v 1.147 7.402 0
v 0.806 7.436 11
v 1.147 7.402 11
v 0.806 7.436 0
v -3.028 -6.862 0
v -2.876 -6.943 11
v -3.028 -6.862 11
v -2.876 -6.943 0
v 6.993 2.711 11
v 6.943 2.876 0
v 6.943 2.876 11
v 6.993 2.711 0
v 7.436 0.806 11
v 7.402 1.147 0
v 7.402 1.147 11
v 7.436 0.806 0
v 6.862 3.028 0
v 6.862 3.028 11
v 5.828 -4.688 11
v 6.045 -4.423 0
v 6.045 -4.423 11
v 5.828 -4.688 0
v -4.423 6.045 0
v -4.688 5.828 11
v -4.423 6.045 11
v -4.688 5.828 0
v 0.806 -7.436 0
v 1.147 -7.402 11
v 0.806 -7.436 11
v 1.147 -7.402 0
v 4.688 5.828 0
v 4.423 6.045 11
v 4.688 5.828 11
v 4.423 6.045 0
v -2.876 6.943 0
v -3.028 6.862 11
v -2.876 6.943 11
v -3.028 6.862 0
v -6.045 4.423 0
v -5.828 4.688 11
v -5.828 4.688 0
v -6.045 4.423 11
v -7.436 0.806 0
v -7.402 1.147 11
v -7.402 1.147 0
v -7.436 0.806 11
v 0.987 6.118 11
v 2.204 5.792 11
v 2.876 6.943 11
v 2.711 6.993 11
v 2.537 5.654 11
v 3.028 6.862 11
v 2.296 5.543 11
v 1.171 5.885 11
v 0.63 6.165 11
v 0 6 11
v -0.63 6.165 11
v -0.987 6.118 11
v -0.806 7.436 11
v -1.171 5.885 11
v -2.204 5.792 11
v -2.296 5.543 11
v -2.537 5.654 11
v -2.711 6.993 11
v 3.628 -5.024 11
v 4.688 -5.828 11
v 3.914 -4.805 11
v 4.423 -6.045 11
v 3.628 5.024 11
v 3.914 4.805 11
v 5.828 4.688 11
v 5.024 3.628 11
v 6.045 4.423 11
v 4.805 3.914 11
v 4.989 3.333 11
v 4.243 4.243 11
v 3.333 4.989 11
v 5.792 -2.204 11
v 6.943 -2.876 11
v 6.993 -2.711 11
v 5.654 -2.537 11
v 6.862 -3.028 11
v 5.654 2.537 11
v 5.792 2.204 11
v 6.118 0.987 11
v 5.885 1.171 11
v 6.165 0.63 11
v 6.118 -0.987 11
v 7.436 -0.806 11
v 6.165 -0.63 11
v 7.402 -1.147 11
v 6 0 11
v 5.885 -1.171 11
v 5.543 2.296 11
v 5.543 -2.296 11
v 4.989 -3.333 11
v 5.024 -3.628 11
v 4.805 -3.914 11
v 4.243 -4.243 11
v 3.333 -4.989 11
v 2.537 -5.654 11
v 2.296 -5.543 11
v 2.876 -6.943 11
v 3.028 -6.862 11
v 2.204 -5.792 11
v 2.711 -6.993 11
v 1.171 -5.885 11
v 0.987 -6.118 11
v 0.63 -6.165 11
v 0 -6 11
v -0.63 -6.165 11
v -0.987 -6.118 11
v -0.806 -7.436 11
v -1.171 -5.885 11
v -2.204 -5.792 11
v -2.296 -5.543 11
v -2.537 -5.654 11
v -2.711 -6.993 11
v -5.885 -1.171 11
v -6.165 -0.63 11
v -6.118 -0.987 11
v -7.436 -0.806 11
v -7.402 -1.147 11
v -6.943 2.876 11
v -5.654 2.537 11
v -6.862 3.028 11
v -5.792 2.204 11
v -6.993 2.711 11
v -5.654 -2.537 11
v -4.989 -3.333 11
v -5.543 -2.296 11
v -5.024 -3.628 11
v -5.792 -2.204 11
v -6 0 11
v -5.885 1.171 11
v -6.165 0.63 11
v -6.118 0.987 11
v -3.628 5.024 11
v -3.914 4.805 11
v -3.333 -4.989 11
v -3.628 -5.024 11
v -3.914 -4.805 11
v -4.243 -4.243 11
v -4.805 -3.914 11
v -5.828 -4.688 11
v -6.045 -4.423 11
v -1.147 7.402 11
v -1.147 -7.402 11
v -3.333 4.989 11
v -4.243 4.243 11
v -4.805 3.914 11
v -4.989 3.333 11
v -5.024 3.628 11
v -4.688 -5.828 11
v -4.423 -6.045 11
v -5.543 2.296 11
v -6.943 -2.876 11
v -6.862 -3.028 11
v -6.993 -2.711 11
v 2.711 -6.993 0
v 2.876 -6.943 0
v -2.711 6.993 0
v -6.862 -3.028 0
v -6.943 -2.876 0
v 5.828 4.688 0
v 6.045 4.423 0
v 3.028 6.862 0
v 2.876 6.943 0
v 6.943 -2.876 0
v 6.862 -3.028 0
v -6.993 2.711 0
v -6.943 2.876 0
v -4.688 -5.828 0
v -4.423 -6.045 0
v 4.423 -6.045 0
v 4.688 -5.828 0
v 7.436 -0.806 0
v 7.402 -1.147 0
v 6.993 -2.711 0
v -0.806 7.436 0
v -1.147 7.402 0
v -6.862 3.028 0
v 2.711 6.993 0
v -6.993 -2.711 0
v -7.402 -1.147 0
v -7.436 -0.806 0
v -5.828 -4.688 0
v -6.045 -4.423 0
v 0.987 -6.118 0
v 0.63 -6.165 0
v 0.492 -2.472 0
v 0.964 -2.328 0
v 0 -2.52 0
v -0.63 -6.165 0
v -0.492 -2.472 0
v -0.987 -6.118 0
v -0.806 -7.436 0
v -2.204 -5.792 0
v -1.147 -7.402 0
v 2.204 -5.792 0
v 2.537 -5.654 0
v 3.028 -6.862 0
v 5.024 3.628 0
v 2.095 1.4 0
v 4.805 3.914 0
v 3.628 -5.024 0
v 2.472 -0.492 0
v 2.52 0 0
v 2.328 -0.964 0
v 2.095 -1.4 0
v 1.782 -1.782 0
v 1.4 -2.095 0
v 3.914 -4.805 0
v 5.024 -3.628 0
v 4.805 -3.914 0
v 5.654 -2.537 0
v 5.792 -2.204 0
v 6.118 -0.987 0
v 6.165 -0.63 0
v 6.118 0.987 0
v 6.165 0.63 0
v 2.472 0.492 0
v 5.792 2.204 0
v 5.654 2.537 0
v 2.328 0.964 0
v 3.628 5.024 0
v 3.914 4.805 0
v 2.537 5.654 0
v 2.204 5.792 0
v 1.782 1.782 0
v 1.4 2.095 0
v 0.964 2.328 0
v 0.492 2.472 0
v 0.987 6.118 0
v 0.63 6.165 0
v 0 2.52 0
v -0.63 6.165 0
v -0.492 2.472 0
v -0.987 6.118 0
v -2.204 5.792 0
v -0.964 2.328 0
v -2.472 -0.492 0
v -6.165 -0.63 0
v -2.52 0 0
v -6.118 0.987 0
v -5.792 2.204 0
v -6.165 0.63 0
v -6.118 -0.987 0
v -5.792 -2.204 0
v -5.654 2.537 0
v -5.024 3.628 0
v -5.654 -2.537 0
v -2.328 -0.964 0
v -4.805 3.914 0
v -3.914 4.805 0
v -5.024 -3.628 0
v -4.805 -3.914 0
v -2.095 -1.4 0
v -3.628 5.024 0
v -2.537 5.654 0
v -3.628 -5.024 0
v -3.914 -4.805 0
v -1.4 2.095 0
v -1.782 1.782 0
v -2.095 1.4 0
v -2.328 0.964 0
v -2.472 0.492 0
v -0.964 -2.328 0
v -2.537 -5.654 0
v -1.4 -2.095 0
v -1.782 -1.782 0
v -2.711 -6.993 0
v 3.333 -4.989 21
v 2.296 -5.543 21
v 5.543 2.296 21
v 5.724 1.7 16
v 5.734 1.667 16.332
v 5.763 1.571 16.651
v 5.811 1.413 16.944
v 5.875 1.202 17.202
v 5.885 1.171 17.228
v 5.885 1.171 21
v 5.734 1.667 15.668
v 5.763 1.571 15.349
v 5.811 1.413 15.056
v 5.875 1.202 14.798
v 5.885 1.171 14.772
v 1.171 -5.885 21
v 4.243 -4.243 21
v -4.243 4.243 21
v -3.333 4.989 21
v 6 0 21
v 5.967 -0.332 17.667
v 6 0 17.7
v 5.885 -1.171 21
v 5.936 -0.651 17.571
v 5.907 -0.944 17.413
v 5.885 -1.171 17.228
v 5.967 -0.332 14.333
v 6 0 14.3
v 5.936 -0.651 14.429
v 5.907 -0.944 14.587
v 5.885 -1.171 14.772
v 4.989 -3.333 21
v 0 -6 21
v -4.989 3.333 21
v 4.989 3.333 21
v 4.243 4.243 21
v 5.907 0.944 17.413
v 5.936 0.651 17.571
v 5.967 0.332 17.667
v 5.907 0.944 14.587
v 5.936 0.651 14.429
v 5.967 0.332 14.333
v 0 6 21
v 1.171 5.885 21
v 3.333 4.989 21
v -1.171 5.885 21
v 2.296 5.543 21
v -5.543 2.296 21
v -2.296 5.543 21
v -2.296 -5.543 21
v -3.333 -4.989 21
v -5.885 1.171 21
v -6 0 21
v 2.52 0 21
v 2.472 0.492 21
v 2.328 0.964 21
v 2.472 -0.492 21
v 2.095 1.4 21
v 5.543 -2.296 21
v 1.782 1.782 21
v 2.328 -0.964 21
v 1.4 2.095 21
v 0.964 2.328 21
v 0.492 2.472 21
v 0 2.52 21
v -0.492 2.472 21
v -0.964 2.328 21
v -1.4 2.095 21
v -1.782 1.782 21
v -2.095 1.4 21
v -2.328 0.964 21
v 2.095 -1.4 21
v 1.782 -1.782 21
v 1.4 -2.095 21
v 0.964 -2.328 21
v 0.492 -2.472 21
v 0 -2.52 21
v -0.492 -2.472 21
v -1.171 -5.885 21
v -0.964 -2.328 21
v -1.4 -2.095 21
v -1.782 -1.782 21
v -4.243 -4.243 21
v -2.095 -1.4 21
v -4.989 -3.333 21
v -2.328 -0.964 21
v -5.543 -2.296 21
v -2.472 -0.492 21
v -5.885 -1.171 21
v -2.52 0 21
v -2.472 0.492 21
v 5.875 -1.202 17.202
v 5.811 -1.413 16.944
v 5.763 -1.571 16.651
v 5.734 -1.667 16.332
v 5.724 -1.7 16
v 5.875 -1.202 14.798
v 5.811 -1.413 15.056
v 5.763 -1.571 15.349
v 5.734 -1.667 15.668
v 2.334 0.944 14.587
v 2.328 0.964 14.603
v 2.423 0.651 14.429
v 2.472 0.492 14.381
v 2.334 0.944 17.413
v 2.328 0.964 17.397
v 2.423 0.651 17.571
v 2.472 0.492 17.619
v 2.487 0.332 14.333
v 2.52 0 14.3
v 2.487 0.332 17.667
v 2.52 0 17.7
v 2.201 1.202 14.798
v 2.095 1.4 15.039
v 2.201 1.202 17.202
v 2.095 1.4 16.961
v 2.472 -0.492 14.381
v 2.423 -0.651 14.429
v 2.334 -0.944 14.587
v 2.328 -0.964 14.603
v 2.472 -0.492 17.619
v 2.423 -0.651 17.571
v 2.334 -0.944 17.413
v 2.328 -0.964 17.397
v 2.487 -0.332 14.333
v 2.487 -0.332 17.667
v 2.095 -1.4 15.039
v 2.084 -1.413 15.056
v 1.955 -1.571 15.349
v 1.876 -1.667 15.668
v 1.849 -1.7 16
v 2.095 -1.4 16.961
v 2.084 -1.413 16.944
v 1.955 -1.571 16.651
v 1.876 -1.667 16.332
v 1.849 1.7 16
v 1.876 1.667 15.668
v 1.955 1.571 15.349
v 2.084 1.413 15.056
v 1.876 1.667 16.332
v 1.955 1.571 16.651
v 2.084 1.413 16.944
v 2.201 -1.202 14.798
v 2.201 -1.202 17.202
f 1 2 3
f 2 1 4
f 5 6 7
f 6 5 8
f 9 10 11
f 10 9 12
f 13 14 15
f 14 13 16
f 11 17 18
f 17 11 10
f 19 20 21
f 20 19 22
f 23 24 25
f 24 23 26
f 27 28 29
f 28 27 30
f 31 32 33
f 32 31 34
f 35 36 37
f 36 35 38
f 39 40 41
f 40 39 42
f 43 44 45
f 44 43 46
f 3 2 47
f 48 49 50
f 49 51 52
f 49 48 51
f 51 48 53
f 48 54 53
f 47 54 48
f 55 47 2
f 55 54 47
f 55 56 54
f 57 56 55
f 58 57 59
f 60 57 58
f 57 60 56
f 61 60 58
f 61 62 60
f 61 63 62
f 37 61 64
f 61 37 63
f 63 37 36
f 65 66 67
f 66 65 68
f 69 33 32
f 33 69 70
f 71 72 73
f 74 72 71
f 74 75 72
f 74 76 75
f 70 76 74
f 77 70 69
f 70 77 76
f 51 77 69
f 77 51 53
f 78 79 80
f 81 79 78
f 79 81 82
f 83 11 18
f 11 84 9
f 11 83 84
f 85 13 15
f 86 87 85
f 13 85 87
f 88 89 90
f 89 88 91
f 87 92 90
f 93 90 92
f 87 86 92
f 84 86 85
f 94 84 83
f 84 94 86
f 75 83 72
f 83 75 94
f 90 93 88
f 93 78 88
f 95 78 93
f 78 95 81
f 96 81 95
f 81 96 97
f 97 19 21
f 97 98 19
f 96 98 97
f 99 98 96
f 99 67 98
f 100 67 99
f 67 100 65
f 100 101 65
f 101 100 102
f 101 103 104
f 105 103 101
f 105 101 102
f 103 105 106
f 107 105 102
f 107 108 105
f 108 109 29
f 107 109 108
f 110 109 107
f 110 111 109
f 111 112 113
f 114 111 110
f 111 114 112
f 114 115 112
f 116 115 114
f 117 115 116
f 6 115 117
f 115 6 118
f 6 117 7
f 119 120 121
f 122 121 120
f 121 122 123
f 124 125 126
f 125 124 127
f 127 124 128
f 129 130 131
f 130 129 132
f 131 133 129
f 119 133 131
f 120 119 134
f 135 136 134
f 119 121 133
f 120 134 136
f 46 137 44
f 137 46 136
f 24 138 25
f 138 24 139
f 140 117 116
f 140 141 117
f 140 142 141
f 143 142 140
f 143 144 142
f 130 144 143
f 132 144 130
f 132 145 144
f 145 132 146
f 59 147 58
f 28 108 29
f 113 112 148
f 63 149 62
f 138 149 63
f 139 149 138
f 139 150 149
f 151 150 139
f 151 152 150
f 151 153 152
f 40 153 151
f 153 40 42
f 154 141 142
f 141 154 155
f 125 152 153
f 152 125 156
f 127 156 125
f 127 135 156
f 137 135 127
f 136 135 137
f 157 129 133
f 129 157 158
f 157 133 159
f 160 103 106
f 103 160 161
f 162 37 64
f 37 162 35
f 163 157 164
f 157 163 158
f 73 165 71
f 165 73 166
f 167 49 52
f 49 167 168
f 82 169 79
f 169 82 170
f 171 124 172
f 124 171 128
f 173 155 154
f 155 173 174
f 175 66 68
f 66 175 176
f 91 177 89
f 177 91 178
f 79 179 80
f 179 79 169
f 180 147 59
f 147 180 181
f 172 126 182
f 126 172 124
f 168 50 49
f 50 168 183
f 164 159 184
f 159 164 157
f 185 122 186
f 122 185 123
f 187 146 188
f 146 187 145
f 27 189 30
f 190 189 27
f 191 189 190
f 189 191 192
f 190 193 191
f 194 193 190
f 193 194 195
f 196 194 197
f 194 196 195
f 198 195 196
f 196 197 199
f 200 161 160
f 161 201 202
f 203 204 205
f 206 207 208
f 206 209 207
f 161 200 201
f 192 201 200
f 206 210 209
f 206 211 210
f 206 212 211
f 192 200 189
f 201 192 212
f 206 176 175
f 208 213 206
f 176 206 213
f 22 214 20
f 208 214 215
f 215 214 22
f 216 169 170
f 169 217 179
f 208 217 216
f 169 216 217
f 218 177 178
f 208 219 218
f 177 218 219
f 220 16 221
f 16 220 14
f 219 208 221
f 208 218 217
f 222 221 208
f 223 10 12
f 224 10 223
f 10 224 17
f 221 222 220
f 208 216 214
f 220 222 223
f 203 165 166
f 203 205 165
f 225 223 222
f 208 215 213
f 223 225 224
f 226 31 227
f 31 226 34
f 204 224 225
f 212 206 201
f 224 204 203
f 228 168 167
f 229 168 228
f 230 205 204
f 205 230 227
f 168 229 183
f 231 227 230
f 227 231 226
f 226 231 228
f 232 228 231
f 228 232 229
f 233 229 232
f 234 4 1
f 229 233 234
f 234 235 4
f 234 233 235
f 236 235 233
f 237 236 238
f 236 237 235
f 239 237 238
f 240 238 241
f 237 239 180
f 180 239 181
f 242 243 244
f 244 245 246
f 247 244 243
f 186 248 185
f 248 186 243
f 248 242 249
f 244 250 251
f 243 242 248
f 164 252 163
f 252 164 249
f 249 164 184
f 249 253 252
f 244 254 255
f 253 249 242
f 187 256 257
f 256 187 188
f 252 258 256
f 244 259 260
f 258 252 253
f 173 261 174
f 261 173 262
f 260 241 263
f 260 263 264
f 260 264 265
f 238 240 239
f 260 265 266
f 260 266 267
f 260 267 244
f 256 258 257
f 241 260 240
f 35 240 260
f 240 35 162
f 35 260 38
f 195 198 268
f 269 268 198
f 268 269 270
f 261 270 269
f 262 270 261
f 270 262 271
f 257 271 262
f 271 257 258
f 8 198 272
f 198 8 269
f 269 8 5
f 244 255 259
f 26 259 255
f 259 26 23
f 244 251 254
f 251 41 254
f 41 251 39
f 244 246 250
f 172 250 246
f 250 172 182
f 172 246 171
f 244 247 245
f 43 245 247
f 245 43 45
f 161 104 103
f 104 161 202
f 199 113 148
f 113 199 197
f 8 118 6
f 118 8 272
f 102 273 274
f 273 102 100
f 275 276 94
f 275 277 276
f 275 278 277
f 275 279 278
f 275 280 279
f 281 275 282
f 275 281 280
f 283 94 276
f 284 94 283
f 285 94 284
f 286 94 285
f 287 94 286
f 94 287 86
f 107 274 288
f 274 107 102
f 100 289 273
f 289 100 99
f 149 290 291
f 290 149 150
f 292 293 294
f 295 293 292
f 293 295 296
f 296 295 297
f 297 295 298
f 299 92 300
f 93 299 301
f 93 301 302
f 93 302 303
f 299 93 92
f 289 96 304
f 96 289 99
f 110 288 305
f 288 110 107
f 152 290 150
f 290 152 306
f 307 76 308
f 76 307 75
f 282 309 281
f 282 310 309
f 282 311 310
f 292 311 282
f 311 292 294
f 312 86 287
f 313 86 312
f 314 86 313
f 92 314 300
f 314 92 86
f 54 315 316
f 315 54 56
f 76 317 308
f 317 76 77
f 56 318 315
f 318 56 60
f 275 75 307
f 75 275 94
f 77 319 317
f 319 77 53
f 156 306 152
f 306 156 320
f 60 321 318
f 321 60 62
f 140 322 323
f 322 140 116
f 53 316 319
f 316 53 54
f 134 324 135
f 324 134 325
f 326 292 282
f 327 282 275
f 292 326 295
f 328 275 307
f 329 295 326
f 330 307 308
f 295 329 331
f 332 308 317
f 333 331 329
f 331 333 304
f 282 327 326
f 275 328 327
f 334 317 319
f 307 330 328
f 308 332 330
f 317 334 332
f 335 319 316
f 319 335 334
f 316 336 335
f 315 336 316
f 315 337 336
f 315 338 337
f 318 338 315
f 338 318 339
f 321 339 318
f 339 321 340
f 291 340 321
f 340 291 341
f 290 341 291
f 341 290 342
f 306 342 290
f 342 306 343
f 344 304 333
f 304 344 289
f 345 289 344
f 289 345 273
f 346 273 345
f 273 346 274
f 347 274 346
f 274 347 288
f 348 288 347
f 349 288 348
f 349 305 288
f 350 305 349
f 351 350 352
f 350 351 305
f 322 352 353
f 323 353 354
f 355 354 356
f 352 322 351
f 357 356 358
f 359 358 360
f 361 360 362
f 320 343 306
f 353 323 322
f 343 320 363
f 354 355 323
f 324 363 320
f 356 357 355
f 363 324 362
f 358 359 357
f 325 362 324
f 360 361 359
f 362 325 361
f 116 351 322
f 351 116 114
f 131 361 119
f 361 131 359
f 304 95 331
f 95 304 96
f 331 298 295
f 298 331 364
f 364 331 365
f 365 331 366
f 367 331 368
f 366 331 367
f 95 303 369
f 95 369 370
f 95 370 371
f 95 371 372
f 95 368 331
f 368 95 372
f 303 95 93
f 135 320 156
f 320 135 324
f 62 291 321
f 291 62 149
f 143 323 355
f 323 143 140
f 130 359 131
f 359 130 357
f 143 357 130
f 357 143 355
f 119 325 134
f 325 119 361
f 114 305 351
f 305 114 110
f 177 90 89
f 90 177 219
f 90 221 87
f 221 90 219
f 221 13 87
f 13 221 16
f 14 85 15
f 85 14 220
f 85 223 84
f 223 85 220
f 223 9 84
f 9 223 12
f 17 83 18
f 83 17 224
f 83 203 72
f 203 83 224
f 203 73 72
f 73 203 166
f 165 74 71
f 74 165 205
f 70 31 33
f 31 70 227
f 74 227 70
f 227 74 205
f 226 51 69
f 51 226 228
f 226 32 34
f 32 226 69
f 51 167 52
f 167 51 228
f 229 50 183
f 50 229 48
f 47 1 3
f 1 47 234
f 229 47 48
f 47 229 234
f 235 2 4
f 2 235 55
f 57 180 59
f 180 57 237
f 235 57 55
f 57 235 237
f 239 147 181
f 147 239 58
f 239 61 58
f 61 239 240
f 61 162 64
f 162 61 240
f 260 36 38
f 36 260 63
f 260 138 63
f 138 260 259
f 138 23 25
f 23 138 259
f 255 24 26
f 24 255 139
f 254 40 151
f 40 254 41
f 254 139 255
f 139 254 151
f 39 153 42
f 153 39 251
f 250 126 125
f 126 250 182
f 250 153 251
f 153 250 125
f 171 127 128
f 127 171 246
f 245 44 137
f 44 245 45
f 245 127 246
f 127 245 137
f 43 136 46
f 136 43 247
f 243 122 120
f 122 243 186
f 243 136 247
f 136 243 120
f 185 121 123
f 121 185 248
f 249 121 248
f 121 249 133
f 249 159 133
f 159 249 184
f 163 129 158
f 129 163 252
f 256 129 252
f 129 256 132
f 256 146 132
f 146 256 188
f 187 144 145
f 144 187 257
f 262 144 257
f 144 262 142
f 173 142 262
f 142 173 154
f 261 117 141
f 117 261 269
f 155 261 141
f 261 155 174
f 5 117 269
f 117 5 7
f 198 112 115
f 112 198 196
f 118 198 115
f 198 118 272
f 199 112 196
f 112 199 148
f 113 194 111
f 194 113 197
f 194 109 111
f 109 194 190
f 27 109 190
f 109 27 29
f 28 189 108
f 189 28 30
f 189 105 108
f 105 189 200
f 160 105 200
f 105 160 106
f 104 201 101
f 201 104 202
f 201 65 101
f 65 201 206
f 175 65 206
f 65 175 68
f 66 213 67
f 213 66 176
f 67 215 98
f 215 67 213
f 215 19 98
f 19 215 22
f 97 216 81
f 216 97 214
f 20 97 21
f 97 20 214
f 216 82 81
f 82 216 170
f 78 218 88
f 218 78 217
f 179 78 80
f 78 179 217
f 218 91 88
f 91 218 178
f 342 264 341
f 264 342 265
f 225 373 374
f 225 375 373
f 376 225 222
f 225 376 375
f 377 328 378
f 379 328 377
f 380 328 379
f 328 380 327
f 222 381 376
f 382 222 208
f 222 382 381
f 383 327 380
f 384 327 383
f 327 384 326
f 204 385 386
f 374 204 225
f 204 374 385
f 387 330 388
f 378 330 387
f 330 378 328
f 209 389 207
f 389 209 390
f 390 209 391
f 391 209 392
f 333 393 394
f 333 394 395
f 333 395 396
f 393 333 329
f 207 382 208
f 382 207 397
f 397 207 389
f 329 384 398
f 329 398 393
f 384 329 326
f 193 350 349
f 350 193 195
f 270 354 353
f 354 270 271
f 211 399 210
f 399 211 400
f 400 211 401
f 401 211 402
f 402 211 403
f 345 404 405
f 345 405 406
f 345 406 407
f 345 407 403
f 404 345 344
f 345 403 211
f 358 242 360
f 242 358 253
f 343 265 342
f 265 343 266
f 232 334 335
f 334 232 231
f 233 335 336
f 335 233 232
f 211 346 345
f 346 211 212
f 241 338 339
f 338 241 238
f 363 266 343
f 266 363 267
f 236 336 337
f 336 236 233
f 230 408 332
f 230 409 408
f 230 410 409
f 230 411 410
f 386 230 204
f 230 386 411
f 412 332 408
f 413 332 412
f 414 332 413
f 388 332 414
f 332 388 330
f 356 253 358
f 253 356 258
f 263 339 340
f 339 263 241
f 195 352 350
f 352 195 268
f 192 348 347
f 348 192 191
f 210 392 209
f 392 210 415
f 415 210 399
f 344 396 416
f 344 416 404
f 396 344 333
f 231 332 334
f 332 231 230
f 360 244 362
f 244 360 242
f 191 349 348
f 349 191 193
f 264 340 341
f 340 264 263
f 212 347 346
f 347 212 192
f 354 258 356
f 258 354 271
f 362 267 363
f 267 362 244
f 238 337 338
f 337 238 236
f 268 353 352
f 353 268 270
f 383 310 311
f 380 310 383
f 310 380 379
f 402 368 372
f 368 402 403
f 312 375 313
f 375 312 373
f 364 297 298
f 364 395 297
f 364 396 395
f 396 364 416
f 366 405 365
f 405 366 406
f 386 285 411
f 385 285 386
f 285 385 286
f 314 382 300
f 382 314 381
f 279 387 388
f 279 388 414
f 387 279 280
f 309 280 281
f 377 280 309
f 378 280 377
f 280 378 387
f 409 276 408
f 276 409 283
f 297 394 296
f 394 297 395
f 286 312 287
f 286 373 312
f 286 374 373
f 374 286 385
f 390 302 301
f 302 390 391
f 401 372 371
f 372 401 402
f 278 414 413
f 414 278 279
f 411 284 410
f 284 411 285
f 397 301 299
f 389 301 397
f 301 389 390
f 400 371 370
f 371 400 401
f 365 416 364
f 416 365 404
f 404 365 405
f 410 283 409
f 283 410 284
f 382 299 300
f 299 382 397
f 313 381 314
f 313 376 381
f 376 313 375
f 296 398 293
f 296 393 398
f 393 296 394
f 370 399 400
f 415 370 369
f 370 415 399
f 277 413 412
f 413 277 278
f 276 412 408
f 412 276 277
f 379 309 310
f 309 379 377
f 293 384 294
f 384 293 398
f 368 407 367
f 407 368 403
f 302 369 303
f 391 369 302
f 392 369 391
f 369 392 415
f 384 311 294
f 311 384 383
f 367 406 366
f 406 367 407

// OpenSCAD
$fn = 32;

// ----------------------------------------------------------------------
// Timing pulley: GT2 24T, pitch 2 mm, 15.03 mm x 21 mm
// ----------------------------------------------------------------------

// --- parameters (mm) ---
belt_pitch = 2;           // belt pitch
n_teeth = 24;             // number of grooves
rim_w = 11;               // belt width between the flanges
tip_d = 15.03;            // tip circle diameter
root_d = 13.53;           // groove bottom diameter
groove_h = 0.75;          // groove depth
tooth_w = 1.5;            // groove width at the tip circle
shaft_d = 5.04;           // shaft bore
hub_d = 12;               // hub diameter
hub_h = 10;               // hub above the flange
bottom_z = 0;             // lowest point of the pulley
top_z = 21;               // highest point of the pulley
set_d = 3.4;              // set screw tap hole

module rim() {
  cylinder(h = rim_w, d = tip_d);
}

module groove_cutter() {
  /* belt tooth groove: deeper than wide, cut through the belt width */
  translate([root_d / 2, 0, 0])
    linear_extrude(height = rim_w)
      polygon(points = [[-0.6, -tooth_w * 0.42], [groove_h + 0.6, -tooth_w * 0.6],
                        [groove_h + 0.6, tooth_w * 0.6], [-0.6, tooth_w * 0.42]]);
}

module hub() {
  translate([0, 0, bottom_z]) cylinder(h = top_z - bottom_z, d = hub_d);
}

difference() {
  union() {
    rim();
    hub();
  }
  for (i = [0 : n_teeth - 1]) rotate([0, 0, i * 360 / n_teeth]) groove_cutter();
  translate([0, 0, bottom_z - 1]) cylinder(h = top_z - bottom_z + 2, d = shaft_d);
  translate([-1, 0, top_z - hub_h * 0.5]) rotate([0, 90, 0]) cylinder(h = hub_d / 2 + 3, d = set_d);
}
